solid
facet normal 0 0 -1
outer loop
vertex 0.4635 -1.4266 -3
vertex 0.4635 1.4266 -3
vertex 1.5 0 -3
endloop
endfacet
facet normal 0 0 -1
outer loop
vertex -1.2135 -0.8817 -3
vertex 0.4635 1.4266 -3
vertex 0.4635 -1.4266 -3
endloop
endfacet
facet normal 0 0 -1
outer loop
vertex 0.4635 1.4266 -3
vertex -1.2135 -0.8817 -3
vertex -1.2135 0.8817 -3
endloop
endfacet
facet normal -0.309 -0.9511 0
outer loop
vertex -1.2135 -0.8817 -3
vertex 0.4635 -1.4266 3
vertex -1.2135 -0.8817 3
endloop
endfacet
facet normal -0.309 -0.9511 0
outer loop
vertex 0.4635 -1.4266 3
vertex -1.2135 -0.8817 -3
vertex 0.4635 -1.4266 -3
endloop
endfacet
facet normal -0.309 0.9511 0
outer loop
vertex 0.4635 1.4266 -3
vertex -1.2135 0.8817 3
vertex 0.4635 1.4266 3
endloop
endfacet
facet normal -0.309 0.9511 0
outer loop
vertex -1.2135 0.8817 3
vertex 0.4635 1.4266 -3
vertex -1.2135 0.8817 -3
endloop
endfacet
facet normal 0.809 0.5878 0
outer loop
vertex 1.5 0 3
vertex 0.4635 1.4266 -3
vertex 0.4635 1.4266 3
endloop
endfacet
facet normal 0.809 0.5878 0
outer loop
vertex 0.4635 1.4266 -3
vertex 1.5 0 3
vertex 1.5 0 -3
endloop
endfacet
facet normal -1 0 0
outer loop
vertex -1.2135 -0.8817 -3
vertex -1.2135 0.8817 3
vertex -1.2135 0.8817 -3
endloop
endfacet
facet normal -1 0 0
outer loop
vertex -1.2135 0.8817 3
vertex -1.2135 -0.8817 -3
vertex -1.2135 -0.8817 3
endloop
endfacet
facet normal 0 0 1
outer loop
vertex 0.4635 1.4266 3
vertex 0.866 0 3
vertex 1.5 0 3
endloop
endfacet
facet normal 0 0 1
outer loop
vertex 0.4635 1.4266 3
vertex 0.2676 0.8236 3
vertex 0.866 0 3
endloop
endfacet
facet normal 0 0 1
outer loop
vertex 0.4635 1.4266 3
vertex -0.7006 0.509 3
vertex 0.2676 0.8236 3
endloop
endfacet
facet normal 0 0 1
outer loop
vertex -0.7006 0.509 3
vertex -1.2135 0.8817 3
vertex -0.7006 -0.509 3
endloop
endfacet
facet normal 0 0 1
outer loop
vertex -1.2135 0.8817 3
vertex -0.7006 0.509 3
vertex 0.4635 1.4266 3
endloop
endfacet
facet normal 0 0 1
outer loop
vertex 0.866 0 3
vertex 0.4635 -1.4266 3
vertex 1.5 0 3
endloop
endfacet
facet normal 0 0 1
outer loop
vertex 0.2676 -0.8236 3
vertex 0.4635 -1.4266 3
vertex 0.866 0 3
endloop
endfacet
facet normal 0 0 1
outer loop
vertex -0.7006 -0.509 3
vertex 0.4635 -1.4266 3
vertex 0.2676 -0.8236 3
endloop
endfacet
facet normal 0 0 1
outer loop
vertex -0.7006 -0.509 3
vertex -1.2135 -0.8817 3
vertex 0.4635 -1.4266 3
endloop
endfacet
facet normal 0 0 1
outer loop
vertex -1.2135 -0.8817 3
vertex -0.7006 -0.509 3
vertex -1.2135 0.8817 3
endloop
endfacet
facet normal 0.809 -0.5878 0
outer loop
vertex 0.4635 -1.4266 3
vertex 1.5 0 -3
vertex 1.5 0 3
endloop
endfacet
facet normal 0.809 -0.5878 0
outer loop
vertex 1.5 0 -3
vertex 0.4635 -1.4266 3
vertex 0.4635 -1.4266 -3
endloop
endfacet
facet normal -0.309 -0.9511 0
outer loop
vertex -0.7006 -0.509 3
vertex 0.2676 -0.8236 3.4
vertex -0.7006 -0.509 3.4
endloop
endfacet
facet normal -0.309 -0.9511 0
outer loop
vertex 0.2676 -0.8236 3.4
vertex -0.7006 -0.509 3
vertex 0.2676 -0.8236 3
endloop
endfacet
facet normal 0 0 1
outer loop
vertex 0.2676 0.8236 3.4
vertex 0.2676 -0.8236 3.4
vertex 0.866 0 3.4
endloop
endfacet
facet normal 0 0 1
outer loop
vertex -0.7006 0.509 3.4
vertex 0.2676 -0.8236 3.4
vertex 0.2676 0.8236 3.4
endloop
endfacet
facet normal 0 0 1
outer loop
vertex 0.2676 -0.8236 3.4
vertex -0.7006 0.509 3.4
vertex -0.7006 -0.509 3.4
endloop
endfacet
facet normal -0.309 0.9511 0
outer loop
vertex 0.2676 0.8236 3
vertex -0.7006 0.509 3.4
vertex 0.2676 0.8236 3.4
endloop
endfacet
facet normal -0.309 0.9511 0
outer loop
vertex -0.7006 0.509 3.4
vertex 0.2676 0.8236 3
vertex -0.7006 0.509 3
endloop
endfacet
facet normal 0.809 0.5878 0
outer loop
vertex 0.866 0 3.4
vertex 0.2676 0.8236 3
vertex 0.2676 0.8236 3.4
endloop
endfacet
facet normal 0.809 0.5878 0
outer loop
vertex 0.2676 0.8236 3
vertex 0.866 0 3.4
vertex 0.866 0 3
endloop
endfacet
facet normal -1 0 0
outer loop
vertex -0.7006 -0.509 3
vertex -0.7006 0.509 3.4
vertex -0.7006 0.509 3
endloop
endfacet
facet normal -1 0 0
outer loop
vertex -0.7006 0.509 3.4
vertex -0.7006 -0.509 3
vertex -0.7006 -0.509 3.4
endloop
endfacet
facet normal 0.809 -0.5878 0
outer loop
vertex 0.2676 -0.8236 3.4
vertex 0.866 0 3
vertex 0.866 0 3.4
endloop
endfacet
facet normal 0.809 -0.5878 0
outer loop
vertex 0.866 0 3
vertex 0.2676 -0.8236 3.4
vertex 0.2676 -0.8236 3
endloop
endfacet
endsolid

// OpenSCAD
// Parameters
length_mm = 6; //[3:12:1]
threaded_length_mm = 6; //[3:12:1]
thread_pitch_mm = 0.5; //[0.25:1:0.05]
major_diameter_mm = 3; //[2.5:4:0.1]
minor_diameter_mm = 2.4; //[2:3.2:0.1]
socket_af_mm = 1.5; //[1:2.5:0.1]
socket_depth_mm = 2; //[1:4:0.1]
point_type_flat = 1; //[0:1:1]
cup_depth_mm = 0.6; //[0:1.5:0.1]
cup_radius_mm = 1.1; //[0.6:1.6:0.1]
runout_length_mm = 0.6; //[0.2:1.5:0.1]
overlap_mm = 0.8; //[0.2:2:0.1]
thread_ridge_radial_mm = 0.15; //[0.05:0.3:0.01]
thread_ridge_width_mm = 0.25; //[0.1:0.5:0.01]
thread_teeth_count = 18; //[8:40:1]

// Screw - complete geometry
module screw() {
  color("DimGray") {
    // Grub screw body
    cylinder(r=major_diameter_mm/2, h=length_mm, center=true);

    // Threaded shaft core
    translate([0, 0, (-length_mm/2) + (threaded_length_mm/2)])
      cylinder(r=minor_diameter_mm/2, h=threaded_length_mm, center=true);

    // Thread runout
    translate([0, 0, (length_mm/2) - (socket_depth_mm) - (runout_length_mm/2) + overlap_mm/2])
      cylinder(r=minor_diameter_mm/2, h=runout_length_mm, center=true);

    // Thread ridge teeth
    for (i = [0:thread_teeth_count-1]) {
      rotate([0, 0, i*360/thread_teeth_count])
        translate([(minor_diameter_mm/2) + thread_ridge_radial_mm - overlap_mm/2, 0, (-length_mm/2) + ((threaded_length_mm - runout_length_mm)/2)])
          cube([thread_ridge_radial_mm*2, thread_ridge_width_mm, threaded_length_mm - runout_length_mm], center=true);
    }

    // Hex socket drive
    translate([0, 0, (length_mm/2) - (socket_depth_mm/2)])
      cylinder(r=socket_af_mm/(2*cos(30)), h=socket_depth_mm + overlap_mm, center=true);

    // Flat or cup point tip
    if (point_type_flat == 0) {
      translate([0, 0, (-length_mm/2) + cup_radius_mm - cup_depth_mm])
        sphere(r=cup_radius_mm, center=true);
    }
  }
}

// Assembly
module assembly() {
  screw();
}

assembly();
